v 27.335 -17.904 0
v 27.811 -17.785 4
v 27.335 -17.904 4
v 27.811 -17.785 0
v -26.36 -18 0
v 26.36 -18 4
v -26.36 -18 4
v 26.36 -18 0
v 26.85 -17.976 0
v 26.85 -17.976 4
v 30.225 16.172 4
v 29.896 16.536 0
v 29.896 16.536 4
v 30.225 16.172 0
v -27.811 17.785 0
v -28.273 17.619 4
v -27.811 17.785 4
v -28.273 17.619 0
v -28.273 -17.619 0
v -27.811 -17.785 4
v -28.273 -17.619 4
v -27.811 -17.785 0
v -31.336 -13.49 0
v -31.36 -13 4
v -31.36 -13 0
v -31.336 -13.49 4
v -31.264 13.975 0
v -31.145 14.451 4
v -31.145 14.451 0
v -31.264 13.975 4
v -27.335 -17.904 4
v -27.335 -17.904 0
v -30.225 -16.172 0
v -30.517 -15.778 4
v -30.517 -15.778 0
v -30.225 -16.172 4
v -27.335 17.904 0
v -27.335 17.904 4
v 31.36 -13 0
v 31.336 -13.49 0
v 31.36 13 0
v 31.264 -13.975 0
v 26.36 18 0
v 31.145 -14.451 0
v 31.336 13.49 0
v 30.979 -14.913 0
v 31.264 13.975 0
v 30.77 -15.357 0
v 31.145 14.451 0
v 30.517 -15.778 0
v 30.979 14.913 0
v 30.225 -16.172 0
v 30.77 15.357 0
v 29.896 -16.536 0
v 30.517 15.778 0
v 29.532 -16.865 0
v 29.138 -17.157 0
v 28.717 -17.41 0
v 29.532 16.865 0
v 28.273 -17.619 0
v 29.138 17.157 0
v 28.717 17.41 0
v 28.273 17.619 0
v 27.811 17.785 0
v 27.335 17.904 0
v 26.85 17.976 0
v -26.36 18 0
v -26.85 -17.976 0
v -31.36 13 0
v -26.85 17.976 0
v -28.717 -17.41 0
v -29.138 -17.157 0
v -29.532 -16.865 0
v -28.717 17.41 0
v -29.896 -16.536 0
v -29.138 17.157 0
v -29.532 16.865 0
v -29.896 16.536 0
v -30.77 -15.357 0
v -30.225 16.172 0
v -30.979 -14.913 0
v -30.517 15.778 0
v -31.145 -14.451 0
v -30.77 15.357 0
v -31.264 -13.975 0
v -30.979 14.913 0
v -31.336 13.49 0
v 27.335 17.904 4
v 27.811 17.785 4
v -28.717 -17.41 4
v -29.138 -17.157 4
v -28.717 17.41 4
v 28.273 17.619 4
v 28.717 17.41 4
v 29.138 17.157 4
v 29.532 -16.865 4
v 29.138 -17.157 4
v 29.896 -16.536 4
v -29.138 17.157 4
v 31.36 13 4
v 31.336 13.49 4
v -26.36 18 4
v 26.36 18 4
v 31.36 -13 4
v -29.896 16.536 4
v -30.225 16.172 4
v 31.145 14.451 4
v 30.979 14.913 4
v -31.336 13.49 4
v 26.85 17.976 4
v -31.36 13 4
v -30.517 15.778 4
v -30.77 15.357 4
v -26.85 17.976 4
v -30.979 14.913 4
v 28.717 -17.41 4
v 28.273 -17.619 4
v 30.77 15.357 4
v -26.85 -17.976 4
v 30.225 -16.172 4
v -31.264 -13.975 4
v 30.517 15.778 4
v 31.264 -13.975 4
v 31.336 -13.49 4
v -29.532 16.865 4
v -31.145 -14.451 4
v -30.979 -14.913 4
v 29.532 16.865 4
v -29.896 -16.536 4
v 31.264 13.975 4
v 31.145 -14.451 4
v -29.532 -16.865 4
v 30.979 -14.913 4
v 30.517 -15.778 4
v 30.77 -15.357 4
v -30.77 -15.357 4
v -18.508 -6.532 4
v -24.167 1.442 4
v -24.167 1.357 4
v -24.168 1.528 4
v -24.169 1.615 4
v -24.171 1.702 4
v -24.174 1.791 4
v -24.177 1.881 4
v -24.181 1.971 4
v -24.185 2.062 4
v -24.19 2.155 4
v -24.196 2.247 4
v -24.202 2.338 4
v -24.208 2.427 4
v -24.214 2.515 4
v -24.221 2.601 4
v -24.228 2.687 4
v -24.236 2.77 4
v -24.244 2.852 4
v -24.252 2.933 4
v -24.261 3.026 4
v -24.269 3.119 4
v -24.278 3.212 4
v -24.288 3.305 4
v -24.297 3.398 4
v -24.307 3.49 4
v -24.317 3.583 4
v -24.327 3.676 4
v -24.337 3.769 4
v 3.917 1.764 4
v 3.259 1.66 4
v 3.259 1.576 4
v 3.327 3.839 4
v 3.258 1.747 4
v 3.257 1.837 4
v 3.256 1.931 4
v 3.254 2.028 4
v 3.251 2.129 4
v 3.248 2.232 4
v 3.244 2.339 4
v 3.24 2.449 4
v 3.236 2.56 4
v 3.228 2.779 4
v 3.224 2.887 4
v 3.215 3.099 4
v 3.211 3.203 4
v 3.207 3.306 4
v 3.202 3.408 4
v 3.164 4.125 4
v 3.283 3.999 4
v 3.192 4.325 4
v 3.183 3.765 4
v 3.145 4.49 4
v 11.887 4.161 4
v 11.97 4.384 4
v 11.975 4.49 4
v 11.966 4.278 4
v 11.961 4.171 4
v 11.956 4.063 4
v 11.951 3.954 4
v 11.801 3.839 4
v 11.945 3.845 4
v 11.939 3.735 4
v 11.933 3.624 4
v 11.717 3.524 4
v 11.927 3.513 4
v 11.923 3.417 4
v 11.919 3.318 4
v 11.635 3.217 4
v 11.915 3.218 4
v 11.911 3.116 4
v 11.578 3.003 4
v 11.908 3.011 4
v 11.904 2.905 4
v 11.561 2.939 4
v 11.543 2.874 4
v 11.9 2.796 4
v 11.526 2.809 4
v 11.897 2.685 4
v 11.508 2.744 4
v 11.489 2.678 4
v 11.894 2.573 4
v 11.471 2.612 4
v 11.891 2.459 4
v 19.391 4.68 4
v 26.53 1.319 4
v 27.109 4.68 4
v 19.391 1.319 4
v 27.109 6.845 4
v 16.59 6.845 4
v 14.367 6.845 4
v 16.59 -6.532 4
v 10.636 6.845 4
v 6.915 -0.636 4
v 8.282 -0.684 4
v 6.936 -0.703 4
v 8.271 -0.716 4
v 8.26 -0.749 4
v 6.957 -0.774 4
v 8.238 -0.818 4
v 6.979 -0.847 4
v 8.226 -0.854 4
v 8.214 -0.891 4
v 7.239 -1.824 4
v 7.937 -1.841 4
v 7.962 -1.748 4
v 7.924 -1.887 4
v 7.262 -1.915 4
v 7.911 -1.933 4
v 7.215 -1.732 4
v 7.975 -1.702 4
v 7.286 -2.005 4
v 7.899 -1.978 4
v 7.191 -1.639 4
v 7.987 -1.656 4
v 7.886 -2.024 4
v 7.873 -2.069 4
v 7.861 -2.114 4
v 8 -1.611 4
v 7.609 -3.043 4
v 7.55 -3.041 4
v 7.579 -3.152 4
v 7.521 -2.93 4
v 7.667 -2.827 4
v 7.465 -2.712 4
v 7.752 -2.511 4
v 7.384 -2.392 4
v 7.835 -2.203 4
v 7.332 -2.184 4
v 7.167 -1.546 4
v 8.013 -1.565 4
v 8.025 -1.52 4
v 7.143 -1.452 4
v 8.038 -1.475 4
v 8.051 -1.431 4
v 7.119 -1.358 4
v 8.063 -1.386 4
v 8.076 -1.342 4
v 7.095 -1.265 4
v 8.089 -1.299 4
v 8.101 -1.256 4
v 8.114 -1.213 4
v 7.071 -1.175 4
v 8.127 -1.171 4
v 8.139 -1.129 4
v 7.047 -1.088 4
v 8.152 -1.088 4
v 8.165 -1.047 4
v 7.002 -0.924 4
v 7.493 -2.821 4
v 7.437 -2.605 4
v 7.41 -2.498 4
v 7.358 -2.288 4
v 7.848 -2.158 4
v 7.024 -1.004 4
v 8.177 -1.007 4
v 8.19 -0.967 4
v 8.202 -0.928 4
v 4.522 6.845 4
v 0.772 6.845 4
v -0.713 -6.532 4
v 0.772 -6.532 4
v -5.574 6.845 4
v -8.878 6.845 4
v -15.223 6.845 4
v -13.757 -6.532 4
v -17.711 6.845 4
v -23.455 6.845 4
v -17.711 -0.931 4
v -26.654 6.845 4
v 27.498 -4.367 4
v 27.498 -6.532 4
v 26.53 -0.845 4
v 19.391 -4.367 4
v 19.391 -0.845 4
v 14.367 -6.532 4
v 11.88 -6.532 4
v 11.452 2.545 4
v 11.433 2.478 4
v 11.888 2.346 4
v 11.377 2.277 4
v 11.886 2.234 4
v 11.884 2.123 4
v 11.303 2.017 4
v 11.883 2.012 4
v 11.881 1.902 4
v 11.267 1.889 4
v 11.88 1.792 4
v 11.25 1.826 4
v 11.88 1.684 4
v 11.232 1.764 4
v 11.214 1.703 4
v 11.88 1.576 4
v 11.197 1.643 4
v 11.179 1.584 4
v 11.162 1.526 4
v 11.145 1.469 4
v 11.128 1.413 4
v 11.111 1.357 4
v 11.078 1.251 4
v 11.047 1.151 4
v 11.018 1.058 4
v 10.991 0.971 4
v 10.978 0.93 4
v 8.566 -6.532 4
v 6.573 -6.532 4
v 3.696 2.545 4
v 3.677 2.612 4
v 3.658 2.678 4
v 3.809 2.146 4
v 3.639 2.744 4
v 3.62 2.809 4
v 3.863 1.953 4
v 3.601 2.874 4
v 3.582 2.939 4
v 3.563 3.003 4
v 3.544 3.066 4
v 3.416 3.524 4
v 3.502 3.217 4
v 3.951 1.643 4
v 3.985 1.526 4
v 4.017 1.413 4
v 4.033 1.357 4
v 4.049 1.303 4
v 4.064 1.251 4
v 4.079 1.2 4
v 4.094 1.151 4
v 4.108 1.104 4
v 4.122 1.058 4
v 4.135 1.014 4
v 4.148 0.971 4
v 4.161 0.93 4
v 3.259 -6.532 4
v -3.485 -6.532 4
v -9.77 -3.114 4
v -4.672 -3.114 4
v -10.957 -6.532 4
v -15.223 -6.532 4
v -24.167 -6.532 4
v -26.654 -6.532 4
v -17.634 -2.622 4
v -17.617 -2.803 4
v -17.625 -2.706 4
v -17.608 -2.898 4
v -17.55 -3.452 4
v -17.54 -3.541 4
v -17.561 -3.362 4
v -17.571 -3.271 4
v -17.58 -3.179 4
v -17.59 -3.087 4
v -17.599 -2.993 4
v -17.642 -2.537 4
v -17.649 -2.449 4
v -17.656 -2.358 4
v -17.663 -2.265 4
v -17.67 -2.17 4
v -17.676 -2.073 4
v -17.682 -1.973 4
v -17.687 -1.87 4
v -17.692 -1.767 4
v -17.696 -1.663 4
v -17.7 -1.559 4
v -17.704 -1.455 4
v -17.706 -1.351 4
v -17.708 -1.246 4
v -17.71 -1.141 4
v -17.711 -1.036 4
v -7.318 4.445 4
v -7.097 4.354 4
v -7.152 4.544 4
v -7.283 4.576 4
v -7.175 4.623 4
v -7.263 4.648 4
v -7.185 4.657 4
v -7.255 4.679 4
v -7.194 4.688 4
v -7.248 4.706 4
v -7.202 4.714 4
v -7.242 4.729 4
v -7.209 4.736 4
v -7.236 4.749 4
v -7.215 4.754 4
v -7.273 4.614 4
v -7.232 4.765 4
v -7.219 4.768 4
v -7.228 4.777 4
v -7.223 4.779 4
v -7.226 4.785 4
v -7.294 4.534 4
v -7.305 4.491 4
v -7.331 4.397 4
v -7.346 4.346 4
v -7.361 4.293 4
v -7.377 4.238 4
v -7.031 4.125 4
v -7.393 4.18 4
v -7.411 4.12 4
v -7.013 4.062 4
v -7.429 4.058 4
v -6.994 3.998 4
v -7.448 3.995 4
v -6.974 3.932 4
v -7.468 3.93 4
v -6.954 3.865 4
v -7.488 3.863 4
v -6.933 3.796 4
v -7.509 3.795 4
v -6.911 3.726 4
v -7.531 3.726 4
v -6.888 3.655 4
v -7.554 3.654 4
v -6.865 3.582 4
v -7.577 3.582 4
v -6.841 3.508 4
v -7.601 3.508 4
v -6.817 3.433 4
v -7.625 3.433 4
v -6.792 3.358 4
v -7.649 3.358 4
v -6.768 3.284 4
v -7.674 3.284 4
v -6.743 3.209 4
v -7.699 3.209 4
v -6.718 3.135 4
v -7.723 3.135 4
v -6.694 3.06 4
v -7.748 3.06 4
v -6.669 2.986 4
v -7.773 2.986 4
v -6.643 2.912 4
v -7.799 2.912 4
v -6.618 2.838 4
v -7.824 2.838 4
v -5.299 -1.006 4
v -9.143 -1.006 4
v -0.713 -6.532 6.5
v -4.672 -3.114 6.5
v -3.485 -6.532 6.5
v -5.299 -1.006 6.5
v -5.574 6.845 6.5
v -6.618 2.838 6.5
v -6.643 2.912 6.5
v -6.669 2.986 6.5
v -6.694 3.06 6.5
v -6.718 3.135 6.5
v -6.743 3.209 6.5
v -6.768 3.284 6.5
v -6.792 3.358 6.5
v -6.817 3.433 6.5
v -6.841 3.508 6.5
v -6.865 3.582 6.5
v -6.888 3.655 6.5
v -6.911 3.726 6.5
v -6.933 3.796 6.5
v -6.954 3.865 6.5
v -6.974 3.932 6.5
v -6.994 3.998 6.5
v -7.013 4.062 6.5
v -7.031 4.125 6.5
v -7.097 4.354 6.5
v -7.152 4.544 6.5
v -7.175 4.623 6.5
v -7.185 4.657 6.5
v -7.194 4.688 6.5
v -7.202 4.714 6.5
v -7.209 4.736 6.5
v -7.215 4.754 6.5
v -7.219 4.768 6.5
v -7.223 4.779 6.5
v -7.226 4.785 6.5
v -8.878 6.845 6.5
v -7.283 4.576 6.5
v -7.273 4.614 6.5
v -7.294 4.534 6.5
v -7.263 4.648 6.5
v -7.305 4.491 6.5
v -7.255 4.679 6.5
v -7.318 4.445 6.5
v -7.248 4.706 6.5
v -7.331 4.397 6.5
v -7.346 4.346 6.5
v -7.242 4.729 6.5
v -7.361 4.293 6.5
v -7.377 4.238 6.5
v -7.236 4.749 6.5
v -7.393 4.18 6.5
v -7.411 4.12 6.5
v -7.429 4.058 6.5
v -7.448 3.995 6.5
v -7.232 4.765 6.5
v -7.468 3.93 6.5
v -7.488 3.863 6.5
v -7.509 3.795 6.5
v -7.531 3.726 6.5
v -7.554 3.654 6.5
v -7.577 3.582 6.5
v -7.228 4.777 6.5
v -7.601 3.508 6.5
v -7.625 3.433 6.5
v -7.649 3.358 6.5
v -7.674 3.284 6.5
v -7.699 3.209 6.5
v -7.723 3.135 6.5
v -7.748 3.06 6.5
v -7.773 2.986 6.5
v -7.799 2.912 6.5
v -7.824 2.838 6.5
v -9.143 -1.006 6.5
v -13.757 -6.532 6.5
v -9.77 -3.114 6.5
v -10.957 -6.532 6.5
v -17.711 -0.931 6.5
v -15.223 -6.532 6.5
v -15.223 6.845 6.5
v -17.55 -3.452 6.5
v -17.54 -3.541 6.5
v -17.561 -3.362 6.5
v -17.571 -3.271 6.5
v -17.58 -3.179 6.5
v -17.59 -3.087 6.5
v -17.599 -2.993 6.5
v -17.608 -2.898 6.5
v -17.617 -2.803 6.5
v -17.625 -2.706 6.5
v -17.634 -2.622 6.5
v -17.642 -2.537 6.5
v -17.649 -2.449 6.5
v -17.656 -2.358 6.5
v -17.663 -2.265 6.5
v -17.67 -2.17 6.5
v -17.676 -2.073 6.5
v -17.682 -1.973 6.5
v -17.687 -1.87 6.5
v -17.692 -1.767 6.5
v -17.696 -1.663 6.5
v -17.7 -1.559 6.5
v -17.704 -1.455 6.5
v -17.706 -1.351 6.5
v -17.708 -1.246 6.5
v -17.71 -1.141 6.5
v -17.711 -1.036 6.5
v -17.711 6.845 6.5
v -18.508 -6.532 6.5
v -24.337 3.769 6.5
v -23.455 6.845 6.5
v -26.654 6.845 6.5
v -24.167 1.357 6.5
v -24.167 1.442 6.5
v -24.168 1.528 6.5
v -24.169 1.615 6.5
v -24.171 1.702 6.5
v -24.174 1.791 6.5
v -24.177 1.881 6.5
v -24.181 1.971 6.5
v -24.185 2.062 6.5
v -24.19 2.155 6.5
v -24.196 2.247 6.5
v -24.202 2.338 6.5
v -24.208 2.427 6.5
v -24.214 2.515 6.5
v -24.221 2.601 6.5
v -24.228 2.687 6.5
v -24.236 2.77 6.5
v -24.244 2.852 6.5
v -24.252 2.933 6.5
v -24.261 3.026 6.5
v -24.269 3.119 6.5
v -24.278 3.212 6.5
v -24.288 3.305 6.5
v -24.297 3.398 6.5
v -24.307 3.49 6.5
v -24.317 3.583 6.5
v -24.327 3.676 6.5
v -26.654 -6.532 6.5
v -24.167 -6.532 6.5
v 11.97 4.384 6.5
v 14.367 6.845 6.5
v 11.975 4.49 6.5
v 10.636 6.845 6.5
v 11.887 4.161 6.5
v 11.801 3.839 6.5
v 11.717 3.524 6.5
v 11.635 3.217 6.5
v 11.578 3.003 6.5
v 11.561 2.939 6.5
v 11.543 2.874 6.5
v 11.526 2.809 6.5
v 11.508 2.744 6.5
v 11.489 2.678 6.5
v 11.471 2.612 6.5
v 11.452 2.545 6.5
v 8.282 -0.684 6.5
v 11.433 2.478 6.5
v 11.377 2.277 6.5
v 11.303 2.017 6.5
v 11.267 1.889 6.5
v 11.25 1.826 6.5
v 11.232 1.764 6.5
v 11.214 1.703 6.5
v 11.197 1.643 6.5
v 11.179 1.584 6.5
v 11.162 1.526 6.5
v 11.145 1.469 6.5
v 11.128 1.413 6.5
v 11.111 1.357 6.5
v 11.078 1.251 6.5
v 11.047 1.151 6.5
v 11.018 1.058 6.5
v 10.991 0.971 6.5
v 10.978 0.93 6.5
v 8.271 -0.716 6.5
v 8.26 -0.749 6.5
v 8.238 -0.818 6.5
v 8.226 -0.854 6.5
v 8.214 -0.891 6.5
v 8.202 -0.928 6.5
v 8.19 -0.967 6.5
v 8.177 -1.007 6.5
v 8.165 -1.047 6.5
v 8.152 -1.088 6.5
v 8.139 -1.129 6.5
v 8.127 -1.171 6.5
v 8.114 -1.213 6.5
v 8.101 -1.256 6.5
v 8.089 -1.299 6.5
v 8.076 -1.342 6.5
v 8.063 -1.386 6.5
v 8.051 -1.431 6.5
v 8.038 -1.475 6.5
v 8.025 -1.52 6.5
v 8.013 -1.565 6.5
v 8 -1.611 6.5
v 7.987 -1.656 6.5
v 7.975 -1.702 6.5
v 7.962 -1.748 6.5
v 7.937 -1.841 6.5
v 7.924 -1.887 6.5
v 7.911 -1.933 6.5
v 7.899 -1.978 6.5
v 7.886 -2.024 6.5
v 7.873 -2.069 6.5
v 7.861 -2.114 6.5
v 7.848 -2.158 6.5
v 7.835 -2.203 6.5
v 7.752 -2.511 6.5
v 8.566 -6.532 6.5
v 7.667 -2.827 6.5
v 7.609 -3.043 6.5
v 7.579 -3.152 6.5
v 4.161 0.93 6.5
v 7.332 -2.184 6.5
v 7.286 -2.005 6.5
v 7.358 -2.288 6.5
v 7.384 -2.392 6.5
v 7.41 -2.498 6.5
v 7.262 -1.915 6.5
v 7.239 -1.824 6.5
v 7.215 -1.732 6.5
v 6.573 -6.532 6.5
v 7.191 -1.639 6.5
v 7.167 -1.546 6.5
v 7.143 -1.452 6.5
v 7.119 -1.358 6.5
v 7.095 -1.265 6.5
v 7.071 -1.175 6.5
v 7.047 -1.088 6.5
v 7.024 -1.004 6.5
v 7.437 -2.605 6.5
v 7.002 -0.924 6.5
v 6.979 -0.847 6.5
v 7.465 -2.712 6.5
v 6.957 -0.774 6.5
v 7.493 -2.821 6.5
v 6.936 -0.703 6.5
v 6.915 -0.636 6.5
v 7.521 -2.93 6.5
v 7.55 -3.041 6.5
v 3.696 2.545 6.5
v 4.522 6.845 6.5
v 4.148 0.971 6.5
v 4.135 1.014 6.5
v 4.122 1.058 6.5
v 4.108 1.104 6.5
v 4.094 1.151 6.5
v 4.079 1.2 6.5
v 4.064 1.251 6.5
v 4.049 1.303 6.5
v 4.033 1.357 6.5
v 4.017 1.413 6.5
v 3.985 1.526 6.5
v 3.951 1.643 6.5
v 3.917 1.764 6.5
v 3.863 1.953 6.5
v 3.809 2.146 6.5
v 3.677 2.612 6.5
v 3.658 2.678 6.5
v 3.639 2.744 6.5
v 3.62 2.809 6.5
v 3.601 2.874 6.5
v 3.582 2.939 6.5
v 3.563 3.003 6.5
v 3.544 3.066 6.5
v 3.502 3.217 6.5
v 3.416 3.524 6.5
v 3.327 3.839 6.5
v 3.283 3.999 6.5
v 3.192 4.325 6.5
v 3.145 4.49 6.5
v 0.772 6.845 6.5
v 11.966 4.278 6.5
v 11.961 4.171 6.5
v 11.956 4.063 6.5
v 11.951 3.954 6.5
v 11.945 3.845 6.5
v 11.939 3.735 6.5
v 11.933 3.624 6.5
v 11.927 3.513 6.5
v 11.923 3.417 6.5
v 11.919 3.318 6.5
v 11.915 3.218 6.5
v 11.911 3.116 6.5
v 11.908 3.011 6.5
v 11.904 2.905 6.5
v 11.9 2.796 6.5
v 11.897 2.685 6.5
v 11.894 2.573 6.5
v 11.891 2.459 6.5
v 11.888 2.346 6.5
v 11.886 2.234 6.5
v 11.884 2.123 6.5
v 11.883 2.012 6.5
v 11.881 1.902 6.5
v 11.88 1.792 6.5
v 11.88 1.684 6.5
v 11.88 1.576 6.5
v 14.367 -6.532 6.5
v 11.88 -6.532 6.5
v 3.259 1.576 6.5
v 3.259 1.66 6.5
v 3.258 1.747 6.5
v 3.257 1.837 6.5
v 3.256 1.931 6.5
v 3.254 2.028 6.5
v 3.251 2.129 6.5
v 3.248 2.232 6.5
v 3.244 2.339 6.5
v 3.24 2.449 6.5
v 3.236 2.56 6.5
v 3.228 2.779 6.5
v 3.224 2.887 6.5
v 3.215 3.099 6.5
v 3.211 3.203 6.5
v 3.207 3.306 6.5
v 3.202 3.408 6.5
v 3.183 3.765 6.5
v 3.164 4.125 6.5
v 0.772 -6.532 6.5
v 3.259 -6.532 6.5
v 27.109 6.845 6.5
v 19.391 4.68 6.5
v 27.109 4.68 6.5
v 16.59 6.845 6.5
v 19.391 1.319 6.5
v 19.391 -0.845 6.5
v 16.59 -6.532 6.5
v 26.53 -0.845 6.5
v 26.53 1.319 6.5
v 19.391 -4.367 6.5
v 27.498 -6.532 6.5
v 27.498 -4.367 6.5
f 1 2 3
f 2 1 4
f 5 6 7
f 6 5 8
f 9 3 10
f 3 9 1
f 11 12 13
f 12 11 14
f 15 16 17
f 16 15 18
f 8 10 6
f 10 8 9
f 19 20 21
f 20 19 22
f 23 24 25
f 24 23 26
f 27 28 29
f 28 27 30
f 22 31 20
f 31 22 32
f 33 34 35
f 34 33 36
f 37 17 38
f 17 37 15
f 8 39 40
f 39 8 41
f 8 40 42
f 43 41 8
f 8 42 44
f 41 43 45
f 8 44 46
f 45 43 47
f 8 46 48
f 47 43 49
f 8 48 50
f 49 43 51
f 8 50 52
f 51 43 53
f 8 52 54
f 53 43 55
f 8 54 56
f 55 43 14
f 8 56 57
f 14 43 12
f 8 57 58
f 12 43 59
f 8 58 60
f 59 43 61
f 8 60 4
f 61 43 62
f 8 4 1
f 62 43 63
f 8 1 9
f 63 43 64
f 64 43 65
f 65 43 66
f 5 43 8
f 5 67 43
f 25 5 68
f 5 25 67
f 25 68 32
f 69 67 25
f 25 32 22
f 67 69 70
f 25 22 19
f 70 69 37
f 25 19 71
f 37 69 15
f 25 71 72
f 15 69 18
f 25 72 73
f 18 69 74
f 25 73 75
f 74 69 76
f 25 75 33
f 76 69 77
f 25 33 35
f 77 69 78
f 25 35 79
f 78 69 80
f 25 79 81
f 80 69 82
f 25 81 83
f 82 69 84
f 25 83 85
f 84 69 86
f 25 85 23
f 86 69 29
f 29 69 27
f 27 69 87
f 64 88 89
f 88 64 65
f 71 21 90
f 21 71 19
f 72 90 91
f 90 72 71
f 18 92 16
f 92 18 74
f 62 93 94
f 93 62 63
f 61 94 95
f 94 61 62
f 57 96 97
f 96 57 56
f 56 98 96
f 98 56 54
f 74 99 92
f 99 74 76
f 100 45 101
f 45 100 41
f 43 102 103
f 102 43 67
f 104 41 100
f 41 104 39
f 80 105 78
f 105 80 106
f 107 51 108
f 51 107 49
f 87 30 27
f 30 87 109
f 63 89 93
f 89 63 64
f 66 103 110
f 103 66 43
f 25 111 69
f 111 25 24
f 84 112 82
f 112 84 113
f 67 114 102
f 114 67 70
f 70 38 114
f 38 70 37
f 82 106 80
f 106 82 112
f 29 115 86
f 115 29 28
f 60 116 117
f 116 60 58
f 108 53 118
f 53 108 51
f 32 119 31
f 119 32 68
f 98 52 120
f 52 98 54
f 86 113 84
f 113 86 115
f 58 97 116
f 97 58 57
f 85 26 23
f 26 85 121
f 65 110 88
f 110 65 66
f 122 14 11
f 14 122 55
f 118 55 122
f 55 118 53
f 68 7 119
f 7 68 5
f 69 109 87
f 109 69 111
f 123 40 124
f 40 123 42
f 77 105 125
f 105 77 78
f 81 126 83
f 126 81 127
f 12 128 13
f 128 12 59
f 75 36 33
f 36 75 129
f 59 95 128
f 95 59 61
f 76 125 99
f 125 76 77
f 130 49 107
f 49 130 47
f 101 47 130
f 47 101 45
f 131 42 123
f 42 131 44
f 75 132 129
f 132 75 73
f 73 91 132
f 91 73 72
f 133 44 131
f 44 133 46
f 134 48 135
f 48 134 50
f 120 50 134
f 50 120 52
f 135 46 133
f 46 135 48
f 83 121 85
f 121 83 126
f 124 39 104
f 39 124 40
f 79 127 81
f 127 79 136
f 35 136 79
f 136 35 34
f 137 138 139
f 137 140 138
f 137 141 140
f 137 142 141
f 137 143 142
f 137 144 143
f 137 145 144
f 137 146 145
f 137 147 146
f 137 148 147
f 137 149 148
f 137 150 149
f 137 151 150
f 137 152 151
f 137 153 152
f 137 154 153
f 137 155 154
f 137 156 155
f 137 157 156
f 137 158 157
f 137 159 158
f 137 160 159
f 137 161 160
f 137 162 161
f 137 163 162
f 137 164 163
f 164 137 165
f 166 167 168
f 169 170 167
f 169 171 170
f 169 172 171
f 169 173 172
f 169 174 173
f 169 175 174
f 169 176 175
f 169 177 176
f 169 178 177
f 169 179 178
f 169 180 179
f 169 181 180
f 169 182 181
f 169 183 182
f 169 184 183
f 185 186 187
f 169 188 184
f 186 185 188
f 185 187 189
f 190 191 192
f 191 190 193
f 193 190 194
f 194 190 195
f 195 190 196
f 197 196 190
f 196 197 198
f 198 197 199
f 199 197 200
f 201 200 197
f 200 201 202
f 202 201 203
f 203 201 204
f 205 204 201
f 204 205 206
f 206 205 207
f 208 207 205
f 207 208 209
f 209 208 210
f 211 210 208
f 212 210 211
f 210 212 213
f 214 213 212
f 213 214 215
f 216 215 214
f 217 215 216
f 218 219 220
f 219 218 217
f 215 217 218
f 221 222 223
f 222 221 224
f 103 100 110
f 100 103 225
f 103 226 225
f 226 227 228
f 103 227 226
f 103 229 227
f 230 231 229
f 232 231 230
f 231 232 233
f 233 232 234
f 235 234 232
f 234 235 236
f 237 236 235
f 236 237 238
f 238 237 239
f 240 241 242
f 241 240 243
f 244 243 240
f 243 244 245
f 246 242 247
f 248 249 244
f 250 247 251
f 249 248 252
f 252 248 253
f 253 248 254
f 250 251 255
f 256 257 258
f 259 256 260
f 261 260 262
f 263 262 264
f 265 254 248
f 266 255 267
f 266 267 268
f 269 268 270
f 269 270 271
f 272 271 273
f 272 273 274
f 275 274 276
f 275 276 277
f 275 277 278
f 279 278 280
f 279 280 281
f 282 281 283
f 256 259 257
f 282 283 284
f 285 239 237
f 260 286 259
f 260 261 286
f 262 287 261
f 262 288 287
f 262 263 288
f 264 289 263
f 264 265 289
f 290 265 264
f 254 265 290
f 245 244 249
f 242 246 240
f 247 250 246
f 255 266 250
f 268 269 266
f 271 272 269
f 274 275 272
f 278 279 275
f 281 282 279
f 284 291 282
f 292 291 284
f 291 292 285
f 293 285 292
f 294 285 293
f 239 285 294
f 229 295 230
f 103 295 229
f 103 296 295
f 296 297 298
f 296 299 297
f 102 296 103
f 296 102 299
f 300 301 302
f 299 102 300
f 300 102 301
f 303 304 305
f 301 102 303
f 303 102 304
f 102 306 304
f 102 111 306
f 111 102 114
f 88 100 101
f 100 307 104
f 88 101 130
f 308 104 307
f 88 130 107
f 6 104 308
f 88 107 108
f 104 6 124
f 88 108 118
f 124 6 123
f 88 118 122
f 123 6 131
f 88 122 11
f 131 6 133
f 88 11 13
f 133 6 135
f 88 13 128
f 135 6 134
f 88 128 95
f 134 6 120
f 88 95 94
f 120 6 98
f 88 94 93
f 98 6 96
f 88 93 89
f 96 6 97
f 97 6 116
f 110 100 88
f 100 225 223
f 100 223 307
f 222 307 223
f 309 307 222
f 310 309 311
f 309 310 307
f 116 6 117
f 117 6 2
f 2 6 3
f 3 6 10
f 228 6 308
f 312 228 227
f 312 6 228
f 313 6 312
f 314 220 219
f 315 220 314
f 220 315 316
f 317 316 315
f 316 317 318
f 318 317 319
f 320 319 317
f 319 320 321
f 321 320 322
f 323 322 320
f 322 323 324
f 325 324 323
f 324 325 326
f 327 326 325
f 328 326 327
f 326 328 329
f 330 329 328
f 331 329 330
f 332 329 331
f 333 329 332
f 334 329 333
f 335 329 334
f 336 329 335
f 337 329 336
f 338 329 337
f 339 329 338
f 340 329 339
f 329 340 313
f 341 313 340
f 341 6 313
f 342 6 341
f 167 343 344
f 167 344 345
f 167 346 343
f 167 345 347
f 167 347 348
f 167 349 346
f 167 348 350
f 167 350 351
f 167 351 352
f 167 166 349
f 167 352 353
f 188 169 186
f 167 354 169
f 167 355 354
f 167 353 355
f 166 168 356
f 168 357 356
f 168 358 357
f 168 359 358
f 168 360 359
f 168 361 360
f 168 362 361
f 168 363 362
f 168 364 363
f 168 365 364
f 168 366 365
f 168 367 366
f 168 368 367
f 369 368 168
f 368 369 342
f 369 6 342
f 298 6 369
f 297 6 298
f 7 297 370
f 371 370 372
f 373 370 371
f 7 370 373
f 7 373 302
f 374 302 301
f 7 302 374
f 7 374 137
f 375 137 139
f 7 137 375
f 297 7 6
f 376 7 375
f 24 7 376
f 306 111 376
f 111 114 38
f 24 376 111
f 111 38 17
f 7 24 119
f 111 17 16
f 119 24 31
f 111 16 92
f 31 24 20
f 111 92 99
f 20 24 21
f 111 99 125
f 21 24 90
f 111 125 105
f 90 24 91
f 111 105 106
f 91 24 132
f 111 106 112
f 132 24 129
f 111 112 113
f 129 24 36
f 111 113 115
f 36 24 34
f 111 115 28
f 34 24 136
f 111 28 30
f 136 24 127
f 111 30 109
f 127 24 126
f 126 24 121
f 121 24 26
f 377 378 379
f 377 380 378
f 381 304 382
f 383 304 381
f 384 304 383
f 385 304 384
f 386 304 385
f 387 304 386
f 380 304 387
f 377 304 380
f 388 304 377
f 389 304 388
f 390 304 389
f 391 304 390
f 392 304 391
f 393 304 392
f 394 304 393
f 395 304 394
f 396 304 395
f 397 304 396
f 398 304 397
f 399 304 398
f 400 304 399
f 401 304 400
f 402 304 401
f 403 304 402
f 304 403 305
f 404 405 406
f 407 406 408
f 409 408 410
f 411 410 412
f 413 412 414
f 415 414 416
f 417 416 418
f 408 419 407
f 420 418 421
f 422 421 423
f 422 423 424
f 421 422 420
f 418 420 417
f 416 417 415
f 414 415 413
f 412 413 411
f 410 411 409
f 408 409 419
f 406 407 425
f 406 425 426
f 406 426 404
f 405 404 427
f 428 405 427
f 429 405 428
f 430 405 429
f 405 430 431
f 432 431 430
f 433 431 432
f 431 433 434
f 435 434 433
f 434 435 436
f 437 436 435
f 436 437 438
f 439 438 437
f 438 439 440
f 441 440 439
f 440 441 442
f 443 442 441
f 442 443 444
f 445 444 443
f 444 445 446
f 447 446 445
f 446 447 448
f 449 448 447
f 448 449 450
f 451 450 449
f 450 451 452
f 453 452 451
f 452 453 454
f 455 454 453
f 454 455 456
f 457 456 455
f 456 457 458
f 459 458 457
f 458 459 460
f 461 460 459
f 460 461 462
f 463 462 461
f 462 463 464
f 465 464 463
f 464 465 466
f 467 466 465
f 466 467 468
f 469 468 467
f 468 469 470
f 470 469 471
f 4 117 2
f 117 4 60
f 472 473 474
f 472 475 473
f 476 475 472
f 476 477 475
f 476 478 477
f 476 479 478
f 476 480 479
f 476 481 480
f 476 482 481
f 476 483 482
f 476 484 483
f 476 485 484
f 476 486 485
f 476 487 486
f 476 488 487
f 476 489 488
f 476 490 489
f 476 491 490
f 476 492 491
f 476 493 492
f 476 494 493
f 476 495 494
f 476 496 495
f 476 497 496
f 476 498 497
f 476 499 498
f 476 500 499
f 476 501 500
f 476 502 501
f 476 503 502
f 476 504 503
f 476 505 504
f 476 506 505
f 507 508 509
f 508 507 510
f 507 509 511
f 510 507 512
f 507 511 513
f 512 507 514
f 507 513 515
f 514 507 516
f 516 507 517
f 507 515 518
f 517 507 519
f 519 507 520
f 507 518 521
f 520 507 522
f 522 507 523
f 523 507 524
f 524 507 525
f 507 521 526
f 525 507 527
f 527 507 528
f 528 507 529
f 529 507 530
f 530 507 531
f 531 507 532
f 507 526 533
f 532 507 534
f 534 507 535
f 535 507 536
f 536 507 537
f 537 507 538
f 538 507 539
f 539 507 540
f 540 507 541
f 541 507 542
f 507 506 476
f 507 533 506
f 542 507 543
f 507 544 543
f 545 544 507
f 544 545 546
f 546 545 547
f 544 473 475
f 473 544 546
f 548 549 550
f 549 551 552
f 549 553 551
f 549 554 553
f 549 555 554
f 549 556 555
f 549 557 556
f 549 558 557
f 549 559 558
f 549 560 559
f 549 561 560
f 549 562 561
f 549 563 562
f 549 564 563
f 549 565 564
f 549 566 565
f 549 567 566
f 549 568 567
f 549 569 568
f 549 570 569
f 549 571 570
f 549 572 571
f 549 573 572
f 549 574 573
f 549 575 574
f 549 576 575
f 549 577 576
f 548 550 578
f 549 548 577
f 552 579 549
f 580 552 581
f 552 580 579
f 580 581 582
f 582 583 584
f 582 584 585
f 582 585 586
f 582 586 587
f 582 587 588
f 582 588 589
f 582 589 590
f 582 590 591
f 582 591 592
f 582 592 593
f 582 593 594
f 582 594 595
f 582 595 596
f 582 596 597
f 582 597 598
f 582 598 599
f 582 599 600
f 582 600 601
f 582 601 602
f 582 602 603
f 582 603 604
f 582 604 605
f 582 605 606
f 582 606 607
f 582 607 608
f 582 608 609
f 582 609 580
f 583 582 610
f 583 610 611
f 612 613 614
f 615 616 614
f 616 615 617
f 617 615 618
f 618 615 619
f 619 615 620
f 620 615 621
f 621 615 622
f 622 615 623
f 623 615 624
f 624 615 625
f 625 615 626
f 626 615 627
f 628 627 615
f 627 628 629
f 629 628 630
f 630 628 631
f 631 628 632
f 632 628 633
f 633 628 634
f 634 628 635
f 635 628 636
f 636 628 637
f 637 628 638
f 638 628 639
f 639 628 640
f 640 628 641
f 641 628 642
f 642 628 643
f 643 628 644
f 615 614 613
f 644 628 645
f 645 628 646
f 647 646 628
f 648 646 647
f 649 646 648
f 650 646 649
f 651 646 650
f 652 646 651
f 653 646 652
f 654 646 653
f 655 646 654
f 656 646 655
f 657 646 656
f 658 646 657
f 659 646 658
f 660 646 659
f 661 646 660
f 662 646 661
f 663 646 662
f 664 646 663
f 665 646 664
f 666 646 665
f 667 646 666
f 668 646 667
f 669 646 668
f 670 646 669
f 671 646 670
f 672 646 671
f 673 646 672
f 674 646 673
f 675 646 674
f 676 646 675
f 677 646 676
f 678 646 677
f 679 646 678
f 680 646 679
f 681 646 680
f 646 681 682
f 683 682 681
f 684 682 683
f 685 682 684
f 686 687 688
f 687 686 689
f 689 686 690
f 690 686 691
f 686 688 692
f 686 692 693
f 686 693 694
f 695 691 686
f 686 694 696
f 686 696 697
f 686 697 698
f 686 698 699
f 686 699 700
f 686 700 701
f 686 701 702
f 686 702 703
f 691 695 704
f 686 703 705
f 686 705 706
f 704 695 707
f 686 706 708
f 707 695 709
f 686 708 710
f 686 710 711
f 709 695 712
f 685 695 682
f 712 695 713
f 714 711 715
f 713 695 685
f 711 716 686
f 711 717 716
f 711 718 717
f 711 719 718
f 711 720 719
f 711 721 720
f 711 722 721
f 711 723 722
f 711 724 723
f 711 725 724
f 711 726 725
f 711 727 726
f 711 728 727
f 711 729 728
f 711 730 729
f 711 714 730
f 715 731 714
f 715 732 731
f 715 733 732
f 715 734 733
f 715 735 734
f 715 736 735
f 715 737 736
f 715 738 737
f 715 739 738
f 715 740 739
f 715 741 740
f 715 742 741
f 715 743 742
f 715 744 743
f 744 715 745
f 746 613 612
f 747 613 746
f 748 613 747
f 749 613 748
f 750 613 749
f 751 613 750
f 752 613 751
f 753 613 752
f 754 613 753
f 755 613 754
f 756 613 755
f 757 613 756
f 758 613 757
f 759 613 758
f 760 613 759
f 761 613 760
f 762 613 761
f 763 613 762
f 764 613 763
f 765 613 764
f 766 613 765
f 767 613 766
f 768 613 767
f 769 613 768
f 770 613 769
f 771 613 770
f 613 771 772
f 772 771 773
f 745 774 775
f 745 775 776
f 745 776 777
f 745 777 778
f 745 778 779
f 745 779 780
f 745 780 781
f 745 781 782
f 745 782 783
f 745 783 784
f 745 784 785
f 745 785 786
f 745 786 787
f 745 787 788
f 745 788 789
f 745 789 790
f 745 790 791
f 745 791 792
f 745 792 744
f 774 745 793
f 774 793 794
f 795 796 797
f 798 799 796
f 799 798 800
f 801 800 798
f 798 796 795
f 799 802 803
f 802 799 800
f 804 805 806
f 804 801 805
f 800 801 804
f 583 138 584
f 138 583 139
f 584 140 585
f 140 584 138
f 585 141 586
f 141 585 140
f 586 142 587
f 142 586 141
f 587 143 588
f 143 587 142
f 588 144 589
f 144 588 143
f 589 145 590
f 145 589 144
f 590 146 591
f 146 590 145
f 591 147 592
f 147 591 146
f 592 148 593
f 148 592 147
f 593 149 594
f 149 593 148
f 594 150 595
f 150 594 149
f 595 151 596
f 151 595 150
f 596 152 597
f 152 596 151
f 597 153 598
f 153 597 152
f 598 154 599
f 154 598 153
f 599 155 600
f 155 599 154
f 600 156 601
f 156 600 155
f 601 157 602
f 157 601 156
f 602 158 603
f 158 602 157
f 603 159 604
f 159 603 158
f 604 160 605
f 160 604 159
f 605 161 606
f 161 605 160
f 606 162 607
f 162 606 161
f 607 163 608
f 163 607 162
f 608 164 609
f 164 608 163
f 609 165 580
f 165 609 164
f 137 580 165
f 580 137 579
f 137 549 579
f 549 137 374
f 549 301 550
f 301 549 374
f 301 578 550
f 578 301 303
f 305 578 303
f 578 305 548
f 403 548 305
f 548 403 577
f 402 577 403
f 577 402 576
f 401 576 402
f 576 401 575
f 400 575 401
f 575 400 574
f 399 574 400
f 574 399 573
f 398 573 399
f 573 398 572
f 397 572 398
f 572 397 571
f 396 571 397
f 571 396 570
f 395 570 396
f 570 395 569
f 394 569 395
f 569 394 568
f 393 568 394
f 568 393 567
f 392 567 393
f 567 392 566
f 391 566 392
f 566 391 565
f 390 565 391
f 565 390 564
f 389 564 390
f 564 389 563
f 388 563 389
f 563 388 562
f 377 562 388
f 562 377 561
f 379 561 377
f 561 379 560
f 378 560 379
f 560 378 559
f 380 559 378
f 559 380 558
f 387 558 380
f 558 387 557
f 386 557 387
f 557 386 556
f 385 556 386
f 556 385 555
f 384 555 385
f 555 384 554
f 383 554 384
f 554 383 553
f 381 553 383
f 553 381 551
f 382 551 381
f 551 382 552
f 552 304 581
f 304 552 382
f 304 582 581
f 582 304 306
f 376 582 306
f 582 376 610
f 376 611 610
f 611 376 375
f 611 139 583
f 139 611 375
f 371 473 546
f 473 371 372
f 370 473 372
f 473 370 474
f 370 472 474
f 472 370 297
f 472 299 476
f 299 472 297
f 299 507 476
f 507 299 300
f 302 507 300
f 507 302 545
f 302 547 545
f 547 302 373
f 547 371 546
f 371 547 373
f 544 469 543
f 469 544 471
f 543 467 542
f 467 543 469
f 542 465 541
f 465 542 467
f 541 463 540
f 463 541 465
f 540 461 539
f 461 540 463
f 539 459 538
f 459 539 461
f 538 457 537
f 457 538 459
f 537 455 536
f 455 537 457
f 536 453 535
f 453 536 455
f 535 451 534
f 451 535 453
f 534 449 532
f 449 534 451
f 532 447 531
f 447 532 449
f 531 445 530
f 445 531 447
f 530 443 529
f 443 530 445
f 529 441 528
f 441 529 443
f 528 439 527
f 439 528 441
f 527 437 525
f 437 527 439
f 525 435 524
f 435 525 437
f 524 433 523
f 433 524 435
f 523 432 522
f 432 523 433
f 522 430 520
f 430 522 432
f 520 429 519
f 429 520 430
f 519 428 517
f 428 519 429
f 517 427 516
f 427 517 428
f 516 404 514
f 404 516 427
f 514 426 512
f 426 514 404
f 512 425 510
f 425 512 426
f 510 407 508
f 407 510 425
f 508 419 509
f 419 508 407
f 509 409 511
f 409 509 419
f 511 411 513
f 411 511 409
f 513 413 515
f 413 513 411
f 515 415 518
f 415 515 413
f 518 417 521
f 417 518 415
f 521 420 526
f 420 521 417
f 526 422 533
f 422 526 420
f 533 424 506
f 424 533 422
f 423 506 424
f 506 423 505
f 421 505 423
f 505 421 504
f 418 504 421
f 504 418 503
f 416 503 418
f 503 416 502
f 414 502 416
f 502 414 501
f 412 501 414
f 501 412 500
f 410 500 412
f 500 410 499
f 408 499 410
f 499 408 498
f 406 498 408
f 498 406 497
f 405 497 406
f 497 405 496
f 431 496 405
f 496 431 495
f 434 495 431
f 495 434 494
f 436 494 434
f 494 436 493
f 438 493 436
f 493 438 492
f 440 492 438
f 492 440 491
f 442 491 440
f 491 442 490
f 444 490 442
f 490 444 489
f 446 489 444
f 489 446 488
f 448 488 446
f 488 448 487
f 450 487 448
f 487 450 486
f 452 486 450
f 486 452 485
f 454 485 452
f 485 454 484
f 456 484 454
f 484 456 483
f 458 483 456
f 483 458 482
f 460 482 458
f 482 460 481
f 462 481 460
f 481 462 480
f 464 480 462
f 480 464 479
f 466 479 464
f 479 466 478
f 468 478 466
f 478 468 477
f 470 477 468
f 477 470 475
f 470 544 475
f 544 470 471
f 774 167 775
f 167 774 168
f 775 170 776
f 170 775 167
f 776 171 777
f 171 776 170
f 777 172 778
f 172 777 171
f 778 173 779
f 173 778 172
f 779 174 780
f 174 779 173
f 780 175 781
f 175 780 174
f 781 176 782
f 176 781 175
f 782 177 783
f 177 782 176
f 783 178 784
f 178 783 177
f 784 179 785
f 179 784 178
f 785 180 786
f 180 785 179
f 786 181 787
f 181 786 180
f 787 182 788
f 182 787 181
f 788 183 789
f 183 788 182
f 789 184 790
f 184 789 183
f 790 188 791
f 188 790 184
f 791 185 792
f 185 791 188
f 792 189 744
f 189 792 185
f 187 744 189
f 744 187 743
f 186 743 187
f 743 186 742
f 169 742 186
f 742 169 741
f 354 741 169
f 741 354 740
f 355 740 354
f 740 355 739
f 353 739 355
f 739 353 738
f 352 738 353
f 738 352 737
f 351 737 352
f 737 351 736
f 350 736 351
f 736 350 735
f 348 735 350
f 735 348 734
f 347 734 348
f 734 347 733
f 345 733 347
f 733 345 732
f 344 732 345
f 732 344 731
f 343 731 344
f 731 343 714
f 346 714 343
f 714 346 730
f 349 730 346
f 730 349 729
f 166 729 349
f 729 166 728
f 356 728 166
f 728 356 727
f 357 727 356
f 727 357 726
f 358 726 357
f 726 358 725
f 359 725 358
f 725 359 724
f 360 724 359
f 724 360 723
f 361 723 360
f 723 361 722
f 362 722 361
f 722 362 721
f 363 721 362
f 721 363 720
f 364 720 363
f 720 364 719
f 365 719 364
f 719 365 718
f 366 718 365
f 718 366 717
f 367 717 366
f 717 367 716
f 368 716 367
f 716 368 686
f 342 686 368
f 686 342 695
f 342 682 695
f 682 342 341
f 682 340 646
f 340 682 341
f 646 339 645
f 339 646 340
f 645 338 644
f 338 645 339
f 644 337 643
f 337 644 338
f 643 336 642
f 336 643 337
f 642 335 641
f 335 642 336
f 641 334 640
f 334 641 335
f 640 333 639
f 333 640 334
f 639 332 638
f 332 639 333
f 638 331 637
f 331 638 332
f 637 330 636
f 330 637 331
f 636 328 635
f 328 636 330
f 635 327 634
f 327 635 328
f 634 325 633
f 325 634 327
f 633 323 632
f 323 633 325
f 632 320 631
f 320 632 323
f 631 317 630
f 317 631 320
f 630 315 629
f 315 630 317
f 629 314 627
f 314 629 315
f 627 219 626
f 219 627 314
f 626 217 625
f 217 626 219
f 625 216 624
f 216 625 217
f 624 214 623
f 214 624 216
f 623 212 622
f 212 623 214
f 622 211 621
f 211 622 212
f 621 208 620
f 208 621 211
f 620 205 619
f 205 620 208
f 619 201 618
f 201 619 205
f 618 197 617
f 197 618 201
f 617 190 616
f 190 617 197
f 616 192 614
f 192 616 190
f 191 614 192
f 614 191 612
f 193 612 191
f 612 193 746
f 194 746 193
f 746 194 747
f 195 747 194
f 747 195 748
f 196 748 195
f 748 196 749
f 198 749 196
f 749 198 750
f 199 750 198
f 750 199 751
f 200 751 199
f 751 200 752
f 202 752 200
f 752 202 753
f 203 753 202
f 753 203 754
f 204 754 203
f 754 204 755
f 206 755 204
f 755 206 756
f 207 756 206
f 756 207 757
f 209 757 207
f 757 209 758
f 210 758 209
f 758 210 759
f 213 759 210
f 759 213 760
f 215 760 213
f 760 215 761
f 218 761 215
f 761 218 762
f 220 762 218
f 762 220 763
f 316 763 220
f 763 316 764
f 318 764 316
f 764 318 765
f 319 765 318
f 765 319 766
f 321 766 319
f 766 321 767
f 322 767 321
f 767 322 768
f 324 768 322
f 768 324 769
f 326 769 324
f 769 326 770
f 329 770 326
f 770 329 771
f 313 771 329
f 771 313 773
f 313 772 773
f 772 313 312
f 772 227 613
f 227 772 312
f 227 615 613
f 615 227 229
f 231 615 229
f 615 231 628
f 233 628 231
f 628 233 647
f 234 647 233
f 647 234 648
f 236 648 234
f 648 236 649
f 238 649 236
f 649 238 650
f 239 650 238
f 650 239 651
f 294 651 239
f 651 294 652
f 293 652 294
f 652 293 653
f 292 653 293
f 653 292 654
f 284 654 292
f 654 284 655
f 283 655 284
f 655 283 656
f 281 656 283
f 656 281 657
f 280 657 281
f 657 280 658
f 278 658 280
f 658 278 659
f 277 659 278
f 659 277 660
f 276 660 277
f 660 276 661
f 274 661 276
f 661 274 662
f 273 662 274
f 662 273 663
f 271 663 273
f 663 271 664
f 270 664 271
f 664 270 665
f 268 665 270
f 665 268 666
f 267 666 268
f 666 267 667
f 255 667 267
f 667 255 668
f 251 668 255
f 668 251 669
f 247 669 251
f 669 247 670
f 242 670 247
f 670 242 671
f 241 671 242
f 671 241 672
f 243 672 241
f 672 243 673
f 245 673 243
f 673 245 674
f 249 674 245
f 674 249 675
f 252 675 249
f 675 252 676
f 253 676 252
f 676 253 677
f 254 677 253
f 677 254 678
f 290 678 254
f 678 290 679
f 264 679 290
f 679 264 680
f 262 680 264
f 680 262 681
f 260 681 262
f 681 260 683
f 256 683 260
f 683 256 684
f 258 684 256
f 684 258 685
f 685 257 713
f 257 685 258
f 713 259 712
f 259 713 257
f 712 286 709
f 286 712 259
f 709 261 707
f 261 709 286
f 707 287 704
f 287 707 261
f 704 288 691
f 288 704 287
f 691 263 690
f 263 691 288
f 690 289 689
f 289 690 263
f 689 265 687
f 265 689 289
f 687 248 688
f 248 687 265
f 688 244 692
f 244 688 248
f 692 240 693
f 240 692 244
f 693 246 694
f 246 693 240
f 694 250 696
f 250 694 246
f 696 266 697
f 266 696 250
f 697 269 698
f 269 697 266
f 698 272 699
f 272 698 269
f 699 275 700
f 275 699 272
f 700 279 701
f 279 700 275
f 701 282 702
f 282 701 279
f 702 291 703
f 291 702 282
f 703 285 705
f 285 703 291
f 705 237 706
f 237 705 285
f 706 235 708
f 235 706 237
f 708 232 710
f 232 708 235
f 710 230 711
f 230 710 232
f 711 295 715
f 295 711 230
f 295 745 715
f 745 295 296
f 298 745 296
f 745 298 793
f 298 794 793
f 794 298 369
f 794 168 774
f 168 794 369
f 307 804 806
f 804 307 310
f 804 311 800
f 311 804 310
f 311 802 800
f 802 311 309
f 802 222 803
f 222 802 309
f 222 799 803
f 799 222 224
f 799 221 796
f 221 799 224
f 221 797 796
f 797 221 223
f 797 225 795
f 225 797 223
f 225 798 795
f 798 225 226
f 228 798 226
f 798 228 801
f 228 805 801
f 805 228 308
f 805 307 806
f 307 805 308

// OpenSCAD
// ============================================================
//  LuxeStyle - Parametrisches Namensschild (Tuer / Schreibtisch)
//  Rendern:  openscad -o out.stl -D 'txt="Familie Mueller"' nameplate.scad
//  Bequemer: python3 make.py nameplate "Familie Mueller"
// ============================================================

/* [Text] */
txt         = "NAME";
font        = "Liberation Sans:style=Bold";
text_size   = 14;   // Schrifthoehe in mm
text_thick  = 2.5;  // erhabener Text in mm

/* [Platte] */
plate_thick = 4;    // Dicke der Grundplatte in mm
margin_x    = 14;   // Rand links/rechts in mm
margin_y    = 11;   // Rand oben/unten in mm
corner_r    = 5;    // Eckenradius in mm

/* [Montage] */
holes       = false; // true = zwei Schraubloecher (fuer Tuerschild)
hole_d      = 4;     // Lochdurchmesser in mm

/* [Qualitaet] */
$fn = 64;

est_w   = max(len(txt), 1) * text_size * 0.62;
plate_w = est_w + 2 * margin_x;
plate_h = text_size + 2 * margin_y;

module rounded_rect(w, h, r) {
    offset(r) offset(-r) square([w, h], center = true);
}

module body() {
    difference() {
        linear_extrude(plate_thick)
            rounded_rect(plate_w, plate_h, corner_r);
        if (holes) {
            for (x = [-1, 1])
                translate([x * (plate_w / 2 - margin_x / 2), 0, -1])
                    cylinder(d = hole_d, h = plate_thick + 2);
        }
    }
}

module label() {
    translate([0, 0, plate_thick])
        linear_extrude(text_thick)
            text(txt, size = text_size, font = font,
                 halign = "center", valign = "center");
}

union() {
    body();
    label();
}
